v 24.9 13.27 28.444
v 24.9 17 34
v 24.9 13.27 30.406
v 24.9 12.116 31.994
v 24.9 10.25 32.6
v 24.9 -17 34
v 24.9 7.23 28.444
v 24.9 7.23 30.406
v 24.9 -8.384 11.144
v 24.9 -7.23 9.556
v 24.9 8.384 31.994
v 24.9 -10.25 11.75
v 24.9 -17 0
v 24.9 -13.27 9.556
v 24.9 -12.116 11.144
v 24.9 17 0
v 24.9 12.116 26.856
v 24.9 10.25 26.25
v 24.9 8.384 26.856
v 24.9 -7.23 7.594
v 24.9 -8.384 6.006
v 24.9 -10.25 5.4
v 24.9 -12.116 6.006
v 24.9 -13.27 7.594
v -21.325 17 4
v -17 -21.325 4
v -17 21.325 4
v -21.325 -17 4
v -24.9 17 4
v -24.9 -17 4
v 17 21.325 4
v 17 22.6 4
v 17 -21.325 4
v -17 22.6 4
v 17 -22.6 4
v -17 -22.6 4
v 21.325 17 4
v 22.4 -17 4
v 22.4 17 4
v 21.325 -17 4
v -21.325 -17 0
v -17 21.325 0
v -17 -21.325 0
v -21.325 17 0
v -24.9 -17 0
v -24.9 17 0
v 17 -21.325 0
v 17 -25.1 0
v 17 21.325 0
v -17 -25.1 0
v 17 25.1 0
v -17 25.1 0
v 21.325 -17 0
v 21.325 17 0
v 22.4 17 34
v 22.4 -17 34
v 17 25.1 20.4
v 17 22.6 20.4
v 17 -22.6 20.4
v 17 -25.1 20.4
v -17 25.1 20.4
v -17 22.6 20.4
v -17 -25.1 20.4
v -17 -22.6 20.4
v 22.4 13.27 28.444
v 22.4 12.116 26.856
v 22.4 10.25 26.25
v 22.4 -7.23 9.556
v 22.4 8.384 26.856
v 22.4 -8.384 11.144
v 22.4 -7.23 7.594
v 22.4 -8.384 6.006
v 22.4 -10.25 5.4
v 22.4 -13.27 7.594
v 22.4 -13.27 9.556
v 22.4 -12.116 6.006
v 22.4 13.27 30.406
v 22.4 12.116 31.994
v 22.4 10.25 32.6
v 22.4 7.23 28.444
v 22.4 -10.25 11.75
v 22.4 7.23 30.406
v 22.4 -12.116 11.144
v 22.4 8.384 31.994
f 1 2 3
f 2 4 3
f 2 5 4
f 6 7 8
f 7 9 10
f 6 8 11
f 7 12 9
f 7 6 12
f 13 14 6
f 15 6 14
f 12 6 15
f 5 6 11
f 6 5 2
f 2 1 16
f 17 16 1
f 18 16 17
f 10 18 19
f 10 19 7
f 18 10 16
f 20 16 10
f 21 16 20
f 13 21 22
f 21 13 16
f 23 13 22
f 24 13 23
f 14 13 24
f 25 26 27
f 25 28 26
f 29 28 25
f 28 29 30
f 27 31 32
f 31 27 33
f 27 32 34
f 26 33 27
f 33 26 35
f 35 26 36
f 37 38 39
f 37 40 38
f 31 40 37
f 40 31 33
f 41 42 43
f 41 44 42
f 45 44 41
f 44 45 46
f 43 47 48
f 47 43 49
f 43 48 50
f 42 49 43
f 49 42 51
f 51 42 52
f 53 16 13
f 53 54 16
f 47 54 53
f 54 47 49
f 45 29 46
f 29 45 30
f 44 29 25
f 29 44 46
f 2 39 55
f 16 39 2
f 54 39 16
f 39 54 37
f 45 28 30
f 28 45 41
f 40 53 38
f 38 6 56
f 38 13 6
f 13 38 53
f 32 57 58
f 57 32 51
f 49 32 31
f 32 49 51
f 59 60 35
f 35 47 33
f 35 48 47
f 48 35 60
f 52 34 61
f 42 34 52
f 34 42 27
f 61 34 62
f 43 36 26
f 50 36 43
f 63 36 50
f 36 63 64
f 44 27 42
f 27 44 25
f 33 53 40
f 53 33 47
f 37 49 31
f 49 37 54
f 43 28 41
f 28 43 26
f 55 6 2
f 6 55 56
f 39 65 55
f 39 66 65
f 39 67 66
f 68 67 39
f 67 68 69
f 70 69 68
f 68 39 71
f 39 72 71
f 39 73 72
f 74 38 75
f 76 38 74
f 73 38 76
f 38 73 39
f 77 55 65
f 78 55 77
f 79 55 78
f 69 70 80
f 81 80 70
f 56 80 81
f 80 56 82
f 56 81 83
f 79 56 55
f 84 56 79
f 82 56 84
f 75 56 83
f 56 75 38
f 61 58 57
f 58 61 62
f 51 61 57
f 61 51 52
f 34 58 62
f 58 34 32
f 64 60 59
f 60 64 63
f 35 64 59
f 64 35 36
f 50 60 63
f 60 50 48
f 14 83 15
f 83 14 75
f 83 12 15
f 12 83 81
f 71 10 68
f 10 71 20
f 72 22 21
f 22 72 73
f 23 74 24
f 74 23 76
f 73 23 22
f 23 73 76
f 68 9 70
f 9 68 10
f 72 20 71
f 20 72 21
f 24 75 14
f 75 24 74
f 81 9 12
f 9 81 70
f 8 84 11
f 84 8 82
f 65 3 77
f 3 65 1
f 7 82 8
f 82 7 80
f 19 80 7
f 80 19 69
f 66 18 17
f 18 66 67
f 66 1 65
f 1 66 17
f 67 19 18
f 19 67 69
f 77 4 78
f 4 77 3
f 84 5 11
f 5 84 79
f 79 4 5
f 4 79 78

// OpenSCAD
//Cube with walls insert template

IM_offset = 0.2;

a = 49.8;
b = 33.6;
c = 6.28;
d = 53.8;
h = 4; //holder height

wall_width = 2.5;
wall_r_h = 20;
wall_l_h = 20;

led_d = 6.75;

module CubeInsert () {
    translate([0,0,h/2])
    difference(){
        union() {   //basic insert design
            cube([a,b+2*IM_offset,h], center=true);
            cube([b+2*IM_offset,a,h], center=true);
            rotate(a=[0,0,45]){
                cube([c,d+2*IM_offset,h], center=true);
            }
            rotate(a=[0,0,-45]){
                cube([c,d+2*IM_offset,h], center=true);
            }
        }
    }
}


module WallInsert () {
    union() {
        CubeInsert();
        translate([a/2-wall_width,-((b+2*IM_offset)/2),0])
            cube([wall_width,b+2*IM_offset,b+2*IM_offset]);
        translate([-((b+2*IM_offset))/2,(a+2*IM_offset)/2-wall_width,0])
            cube([b+2*IM_offset,wall_width,wall_r_h+2*IM_offset]);
        translate([-((b+2*IM_offset))/2,-((a+2*IM_offset)/2),0])
            cube([b+2*IM_offset,wall_width,wall_l_h+2*IM_offset]);
    }
}

module LEDInsert () {
    difference() {
        WallInsert();
        translate([15,-((b+2*IM_offset)/2-6.75),(led_d-2*IM_offset)/2+h+1.4])
        rotate([0,90,0])
            cylinder(h=15,d=led_d-2*IM_offset);
        translate([15,((b+2*IM_offset)/2-6.75),(b+2*IM_offset)-((led_d-2*IM_offset)/2+1.4)])
        rotate([0,90,0])
            cylinder(h=15,d=led_d-2*IM_offset);
    }
}

LEDInsert();
